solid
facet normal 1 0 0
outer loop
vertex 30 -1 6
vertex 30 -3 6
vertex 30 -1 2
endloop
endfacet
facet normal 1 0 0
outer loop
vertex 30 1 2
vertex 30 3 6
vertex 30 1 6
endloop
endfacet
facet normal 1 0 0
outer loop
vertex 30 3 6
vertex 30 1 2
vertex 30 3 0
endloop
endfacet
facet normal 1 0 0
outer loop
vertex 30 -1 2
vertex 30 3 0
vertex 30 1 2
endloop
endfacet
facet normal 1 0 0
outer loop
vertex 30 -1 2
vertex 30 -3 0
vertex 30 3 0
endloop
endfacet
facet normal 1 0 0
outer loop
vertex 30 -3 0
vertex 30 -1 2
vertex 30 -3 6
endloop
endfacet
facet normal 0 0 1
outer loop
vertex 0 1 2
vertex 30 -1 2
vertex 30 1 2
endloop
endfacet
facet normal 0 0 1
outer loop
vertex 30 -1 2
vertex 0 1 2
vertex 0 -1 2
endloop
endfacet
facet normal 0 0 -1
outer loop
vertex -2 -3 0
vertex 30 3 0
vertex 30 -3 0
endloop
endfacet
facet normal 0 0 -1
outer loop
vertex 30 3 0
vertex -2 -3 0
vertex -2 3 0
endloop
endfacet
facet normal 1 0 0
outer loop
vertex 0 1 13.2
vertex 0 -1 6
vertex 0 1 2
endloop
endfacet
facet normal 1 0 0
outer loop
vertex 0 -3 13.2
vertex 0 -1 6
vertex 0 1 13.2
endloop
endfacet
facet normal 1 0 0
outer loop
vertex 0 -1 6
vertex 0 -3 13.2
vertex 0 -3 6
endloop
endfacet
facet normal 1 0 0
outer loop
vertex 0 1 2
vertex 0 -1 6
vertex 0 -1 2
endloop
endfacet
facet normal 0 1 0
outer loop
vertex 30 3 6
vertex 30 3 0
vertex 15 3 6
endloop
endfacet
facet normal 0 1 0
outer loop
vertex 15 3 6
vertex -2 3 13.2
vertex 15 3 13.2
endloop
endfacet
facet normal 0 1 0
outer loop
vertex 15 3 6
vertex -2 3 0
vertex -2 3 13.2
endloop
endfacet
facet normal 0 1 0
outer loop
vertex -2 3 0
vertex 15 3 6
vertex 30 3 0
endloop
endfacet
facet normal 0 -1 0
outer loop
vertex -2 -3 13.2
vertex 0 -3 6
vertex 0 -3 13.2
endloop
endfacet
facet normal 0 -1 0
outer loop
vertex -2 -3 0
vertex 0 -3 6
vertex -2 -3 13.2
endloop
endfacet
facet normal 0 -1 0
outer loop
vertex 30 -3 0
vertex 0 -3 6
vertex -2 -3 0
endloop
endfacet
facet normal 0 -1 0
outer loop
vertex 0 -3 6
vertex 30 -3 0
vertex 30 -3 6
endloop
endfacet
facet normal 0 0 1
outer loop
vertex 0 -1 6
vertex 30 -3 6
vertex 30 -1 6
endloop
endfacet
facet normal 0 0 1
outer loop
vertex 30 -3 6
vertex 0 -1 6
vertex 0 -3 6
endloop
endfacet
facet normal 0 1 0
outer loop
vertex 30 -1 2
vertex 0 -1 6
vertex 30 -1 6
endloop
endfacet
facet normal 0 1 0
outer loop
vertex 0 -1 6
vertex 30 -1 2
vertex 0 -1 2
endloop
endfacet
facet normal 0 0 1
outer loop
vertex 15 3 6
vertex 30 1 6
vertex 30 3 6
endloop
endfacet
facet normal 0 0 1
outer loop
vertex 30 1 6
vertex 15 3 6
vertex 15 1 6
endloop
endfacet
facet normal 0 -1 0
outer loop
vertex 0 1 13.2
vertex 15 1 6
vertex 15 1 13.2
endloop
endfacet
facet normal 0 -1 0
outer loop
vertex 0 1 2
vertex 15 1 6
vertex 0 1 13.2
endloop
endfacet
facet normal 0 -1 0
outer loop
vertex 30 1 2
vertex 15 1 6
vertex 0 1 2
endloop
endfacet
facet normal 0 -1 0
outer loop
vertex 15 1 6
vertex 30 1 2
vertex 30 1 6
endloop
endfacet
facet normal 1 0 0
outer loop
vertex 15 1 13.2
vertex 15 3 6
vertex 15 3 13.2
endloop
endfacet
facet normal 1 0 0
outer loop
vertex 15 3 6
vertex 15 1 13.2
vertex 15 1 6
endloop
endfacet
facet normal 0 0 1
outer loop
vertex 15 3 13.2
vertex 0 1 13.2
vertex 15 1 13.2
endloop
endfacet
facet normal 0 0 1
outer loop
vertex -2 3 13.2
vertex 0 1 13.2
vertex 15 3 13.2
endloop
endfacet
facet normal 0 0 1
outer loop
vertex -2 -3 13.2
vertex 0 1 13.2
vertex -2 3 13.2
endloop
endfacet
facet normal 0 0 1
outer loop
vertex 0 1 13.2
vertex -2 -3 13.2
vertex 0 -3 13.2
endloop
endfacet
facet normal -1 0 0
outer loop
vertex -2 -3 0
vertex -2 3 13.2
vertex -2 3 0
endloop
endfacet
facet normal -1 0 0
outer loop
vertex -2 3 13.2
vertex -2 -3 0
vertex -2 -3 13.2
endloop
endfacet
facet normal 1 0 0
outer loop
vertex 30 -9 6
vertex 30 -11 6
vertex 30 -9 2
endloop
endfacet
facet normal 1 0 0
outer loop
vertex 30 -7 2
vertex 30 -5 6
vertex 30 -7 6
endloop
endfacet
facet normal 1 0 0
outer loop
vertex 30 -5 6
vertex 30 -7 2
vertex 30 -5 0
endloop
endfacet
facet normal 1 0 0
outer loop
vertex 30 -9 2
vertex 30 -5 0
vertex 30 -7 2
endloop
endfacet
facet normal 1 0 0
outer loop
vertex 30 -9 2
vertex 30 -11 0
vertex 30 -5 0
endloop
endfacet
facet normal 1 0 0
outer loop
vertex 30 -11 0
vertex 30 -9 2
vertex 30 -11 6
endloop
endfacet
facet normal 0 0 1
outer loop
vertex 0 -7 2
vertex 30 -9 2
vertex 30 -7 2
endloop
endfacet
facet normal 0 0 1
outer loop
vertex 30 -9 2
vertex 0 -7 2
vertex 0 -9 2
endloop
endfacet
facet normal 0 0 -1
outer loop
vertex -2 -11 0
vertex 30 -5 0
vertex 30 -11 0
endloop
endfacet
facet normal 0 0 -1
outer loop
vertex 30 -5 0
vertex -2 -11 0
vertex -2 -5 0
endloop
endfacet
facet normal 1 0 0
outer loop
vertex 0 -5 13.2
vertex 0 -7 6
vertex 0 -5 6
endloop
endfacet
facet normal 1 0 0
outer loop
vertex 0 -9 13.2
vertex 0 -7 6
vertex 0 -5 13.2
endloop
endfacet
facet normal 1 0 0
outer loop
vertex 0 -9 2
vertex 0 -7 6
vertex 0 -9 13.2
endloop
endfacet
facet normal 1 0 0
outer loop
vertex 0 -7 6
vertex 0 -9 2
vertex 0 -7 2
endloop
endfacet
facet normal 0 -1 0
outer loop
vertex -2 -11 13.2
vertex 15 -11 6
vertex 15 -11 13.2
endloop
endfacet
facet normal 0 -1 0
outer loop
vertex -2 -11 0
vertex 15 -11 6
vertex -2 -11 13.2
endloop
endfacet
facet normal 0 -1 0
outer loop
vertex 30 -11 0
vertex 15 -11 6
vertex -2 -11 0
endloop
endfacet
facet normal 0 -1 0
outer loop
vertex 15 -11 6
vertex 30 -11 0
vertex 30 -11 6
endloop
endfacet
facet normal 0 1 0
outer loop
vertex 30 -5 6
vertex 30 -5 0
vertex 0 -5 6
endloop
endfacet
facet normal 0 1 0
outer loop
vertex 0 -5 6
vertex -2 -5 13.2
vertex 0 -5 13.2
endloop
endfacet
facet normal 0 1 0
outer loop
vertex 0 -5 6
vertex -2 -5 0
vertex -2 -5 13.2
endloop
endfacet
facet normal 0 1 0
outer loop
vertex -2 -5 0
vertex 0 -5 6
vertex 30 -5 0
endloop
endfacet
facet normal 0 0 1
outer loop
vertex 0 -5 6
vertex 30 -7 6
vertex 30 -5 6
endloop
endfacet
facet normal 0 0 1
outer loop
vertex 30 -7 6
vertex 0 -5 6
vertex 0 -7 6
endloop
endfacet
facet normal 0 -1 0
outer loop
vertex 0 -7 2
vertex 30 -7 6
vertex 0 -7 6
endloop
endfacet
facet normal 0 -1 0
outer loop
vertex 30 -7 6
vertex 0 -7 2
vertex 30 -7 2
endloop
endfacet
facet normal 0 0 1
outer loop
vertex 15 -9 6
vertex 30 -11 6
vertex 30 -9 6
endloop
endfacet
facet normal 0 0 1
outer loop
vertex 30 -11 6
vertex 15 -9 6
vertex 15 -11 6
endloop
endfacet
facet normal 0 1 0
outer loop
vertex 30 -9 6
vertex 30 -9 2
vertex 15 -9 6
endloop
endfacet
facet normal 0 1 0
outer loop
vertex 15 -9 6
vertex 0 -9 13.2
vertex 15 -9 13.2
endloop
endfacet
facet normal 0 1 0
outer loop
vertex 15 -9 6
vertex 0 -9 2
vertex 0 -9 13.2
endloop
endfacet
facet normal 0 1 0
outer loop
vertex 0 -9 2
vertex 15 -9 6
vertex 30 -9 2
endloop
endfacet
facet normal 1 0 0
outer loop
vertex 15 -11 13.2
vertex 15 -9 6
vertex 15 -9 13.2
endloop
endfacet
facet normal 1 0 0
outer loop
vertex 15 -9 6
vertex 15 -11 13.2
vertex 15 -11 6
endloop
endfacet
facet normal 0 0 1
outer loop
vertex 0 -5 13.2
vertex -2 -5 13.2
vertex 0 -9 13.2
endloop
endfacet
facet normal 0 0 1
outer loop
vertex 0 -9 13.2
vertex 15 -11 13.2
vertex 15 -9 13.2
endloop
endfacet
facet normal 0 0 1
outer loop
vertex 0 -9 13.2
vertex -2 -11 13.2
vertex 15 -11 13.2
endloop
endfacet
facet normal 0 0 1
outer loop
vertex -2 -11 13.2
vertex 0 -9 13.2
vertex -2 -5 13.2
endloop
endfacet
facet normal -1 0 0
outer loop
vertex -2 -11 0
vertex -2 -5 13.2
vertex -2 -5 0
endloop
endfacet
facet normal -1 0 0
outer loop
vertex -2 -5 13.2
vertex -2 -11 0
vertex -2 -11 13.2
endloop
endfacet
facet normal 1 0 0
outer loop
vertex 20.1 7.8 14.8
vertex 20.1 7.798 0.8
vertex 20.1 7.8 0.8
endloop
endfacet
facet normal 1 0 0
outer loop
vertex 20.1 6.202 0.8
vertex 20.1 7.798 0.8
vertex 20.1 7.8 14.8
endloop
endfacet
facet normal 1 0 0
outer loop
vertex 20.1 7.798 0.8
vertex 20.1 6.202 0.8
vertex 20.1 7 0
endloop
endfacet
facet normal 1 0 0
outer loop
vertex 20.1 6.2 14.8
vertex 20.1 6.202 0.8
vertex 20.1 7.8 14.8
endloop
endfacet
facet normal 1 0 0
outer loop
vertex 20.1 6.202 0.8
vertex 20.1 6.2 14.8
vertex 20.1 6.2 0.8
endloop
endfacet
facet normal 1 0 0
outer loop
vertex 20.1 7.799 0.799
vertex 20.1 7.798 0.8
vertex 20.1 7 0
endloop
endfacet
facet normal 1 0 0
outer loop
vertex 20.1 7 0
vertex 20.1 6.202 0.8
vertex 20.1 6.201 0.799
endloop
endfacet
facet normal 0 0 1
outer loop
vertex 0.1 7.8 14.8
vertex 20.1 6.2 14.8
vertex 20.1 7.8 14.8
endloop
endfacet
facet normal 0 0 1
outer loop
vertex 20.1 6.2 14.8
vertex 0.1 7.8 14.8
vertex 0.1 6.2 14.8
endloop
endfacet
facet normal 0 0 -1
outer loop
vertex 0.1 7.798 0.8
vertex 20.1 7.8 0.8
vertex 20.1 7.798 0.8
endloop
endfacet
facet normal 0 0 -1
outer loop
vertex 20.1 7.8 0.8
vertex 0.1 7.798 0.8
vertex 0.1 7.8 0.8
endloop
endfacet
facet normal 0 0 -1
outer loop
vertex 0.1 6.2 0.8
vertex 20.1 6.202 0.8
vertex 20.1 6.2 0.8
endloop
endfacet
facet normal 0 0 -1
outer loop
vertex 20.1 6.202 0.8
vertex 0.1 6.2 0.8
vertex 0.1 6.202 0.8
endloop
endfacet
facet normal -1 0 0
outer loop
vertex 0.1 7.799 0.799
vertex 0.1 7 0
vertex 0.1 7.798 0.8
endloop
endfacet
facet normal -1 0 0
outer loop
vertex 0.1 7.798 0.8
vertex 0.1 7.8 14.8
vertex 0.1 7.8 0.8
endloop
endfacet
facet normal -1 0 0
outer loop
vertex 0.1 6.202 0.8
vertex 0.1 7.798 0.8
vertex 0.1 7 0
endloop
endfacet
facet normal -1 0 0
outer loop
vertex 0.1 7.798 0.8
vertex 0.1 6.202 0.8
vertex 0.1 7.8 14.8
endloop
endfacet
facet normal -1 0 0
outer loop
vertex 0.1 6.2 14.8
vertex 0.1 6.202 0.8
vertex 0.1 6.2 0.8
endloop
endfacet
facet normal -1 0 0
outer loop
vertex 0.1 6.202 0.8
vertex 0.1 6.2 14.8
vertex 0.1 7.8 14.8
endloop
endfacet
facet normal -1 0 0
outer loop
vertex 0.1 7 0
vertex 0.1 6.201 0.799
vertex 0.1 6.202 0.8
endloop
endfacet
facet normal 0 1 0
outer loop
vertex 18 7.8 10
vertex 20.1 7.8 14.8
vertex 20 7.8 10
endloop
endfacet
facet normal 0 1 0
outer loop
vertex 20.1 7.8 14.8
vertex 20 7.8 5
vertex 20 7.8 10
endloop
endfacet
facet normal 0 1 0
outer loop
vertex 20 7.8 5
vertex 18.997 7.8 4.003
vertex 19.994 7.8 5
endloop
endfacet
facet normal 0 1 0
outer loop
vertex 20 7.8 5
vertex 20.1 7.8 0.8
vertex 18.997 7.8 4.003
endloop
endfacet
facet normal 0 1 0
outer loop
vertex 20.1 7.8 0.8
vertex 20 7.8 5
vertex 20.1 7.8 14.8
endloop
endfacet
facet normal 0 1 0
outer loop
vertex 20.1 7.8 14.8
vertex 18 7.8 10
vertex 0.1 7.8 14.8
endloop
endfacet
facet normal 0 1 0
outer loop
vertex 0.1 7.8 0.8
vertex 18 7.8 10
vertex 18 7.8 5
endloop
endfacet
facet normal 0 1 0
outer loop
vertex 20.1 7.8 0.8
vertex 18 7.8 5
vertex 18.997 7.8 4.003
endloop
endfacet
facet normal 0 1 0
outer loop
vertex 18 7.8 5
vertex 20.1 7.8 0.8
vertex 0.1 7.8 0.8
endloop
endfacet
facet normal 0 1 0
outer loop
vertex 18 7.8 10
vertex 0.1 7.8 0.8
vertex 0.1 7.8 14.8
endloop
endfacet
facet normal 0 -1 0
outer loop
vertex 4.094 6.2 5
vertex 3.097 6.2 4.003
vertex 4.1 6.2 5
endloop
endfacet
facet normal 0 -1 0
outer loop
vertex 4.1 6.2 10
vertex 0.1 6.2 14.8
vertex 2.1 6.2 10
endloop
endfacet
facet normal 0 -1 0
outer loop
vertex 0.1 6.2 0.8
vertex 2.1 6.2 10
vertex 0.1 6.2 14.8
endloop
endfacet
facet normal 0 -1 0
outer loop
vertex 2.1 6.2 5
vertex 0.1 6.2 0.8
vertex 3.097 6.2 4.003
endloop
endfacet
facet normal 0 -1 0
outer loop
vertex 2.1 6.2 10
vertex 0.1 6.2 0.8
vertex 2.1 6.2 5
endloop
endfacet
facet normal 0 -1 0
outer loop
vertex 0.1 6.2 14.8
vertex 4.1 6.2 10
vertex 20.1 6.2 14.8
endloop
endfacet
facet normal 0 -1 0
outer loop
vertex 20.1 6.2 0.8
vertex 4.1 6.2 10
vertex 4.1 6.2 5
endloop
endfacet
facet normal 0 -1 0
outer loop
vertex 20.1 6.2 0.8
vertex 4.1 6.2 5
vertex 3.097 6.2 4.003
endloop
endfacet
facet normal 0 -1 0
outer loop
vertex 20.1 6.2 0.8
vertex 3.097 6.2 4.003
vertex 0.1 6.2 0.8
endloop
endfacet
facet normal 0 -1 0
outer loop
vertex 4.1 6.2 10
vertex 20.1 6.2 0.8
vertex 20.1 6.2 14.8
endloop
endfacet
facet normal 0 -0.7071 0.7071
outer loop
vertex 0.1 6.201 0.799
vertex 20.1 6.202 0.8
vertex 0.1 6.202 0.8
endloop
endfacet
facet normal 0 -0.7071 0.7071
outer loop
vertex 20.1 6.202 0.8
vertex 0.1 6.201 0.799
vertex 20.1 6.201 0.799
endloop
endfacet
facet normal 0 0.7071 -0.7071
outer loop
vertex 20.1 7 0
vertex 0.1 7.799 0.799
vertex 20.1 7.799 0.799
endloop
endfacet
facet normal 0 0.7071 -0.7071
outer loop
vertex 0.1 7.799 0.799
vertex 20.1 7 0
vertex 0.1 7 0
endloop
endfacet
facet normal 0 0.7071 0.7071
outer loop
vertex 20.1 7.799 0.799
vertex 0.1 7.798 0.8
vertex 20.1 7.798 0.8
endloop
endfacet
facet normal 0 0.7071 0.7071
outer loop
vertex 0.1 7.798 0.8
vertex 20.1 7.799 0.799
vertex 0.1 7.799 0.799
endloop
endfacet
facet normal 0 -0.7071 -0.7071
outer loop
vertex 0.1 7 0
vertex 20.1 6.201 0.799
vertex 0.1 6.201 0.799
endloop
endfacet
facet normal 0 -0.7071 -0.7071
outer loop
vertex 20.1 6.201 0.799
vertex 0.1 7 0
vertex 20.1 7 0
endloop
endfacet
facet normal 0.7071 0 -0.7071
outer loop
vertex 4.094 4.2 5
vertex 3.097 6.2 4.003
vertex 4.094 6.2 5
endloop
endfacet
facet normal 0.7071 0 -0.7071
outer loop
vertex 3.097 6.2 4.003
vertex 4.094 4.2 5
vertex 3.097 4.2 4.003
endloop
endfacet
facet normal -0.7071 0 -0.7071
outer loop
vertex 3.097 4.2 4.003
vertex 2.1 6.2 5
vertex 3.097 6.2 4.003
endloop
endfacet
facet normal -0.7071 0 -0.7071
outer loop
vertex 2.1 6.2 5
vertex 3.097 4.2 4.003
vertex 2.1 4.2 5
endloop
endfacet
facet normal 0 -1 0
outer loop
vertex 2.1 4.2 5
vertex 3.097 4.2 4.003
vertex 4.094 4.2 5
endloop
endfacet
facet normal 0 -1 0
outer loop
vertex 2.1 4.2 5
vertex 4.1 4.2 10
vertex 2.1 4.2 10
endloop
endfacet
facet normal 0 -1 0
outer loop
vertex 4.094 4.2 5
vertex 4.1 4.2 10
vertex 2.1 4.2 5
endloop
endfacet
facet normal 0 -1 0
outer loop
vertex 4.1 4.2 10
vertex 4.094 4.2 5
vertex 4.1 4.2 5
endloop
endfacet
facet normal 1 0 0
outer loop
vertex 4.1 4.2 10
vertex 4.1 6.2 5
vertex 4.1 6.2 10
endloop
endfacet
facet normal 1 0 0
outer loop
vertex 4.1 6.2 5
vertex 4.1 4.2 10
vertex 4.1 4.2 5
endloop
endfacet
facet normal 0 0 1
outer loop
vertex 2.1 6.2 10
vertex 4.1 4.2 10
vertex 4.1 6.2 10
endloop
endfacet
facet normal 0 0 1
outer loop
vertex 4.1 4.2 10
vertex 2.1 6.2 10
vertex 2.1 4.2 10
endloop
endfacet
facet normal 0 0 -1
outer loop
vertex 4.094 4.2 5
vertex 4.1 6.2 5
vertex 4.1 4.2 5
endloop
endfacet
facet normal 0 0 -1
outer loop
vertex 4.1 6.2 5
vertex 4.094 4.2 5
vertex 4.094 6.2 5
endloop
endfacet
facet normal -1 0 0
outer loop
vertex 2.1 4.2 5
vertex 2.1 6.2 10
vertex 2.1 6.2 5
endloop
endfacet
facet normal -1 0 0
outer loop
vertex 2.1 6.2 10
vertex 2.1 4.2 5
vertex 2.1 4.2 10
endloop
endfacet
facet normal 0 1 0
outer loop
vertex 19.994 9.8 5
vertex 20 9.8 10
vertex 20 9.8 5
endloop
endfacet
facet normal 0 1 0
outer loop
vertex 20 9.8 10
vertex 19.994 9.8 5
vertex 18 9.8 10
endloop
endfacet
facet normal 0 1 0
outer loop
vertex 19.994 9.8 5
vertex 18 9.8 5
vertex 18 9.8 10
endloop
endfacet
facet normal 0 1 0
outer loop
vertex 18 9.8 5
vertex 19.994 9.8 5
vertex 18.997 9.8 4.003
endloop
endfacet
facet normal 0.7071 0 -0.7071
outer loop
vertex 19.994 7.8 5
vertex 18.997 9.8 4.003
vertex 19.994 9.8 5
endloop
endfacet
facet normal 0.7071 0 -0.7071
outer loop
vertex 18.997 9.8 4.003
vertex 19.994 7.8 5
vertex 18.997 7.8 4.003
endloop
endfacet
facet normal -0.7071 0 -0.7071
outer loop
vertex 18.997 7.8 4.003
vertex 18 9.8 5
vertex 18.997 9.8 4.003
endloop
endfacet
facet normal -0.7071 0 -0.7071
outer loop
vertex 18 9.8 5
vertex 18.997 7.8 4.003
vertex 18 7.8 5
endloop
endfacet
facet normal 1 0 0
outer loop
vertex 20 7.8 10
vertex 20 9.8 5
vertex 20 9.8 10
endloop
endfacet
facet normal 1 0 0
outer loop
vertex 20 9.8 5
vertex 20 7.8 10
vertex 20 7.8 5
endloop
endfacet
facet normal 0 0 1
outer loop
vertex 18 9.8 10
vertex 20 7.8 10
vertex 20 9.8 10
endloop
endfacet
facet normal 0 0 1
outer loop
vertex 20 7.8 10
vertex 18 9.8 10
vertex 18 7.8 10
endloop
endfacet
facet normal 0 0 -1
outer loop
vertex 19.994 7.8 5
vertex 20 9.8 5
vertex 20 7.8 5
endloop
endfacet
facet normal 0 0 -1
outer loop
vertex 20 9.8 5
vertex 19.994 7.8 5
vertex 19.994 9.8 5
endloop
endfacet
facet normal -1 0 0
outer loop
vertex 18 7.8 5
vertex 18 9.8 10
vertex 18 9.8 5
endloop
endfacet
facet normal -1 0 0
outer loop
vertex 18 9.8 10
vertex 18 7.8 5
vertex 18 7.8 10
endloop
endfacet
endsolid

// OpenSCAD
module rail () {
    module rail_part () {
        //base
        translate([0, -3, 0])
        cube(size=[30, 6, 2]);
    
        // rail side 1
        translate([0, -3, 2])
        cube(size=[30, 2, 4]);
    
        // rail side 2
        translate([0, 1, 2])
        cube(size=[30, 2, 4]);
    
        // rail side 2
        translate([0, 1, 2])
        cube(size=[15, 2, 11.2]);
        
            // end 1
        translate([-2, -3, 0])
        cube([2, 6, 13.2]);
    }
    
    union () {
    rail_part();
    translate([0, -8, 0])
    mirror([0,1,0])
    //rotate([0, 180, 0])
    rail_part();
    

    
    // end 2
    //translate([30, -3, 0])
    //cube([2, 6, 11.2]);
    }
}

module slider() {
    union() {
    translate([0.1, -0.8, 2.8])
    cube(size=[20, 1.6, 14]);

    translate([0.1, 0, 2.0])
    rotate([45, 0, 0])
    cube(size=[20, 1.13, 1.13]);
    
    translate([2.1, -2.8, 7.0])
    rotate([0, 45, 0])
    cube(size = [1.41,2,1.41]);
        
    translate([2.1, -2.8, 7])
    cube(size = [2,2,5]);
    
    translate([18, 0.8, 7.0])
    rotate([0, 45, 0])
    cube(size = [1.41,2,1.41]);
        
    translate([18, 0.8, 7])
    cube(size = [2,2,5]);
    }
}

rail();

translate([0, 7, -2])
slider();
